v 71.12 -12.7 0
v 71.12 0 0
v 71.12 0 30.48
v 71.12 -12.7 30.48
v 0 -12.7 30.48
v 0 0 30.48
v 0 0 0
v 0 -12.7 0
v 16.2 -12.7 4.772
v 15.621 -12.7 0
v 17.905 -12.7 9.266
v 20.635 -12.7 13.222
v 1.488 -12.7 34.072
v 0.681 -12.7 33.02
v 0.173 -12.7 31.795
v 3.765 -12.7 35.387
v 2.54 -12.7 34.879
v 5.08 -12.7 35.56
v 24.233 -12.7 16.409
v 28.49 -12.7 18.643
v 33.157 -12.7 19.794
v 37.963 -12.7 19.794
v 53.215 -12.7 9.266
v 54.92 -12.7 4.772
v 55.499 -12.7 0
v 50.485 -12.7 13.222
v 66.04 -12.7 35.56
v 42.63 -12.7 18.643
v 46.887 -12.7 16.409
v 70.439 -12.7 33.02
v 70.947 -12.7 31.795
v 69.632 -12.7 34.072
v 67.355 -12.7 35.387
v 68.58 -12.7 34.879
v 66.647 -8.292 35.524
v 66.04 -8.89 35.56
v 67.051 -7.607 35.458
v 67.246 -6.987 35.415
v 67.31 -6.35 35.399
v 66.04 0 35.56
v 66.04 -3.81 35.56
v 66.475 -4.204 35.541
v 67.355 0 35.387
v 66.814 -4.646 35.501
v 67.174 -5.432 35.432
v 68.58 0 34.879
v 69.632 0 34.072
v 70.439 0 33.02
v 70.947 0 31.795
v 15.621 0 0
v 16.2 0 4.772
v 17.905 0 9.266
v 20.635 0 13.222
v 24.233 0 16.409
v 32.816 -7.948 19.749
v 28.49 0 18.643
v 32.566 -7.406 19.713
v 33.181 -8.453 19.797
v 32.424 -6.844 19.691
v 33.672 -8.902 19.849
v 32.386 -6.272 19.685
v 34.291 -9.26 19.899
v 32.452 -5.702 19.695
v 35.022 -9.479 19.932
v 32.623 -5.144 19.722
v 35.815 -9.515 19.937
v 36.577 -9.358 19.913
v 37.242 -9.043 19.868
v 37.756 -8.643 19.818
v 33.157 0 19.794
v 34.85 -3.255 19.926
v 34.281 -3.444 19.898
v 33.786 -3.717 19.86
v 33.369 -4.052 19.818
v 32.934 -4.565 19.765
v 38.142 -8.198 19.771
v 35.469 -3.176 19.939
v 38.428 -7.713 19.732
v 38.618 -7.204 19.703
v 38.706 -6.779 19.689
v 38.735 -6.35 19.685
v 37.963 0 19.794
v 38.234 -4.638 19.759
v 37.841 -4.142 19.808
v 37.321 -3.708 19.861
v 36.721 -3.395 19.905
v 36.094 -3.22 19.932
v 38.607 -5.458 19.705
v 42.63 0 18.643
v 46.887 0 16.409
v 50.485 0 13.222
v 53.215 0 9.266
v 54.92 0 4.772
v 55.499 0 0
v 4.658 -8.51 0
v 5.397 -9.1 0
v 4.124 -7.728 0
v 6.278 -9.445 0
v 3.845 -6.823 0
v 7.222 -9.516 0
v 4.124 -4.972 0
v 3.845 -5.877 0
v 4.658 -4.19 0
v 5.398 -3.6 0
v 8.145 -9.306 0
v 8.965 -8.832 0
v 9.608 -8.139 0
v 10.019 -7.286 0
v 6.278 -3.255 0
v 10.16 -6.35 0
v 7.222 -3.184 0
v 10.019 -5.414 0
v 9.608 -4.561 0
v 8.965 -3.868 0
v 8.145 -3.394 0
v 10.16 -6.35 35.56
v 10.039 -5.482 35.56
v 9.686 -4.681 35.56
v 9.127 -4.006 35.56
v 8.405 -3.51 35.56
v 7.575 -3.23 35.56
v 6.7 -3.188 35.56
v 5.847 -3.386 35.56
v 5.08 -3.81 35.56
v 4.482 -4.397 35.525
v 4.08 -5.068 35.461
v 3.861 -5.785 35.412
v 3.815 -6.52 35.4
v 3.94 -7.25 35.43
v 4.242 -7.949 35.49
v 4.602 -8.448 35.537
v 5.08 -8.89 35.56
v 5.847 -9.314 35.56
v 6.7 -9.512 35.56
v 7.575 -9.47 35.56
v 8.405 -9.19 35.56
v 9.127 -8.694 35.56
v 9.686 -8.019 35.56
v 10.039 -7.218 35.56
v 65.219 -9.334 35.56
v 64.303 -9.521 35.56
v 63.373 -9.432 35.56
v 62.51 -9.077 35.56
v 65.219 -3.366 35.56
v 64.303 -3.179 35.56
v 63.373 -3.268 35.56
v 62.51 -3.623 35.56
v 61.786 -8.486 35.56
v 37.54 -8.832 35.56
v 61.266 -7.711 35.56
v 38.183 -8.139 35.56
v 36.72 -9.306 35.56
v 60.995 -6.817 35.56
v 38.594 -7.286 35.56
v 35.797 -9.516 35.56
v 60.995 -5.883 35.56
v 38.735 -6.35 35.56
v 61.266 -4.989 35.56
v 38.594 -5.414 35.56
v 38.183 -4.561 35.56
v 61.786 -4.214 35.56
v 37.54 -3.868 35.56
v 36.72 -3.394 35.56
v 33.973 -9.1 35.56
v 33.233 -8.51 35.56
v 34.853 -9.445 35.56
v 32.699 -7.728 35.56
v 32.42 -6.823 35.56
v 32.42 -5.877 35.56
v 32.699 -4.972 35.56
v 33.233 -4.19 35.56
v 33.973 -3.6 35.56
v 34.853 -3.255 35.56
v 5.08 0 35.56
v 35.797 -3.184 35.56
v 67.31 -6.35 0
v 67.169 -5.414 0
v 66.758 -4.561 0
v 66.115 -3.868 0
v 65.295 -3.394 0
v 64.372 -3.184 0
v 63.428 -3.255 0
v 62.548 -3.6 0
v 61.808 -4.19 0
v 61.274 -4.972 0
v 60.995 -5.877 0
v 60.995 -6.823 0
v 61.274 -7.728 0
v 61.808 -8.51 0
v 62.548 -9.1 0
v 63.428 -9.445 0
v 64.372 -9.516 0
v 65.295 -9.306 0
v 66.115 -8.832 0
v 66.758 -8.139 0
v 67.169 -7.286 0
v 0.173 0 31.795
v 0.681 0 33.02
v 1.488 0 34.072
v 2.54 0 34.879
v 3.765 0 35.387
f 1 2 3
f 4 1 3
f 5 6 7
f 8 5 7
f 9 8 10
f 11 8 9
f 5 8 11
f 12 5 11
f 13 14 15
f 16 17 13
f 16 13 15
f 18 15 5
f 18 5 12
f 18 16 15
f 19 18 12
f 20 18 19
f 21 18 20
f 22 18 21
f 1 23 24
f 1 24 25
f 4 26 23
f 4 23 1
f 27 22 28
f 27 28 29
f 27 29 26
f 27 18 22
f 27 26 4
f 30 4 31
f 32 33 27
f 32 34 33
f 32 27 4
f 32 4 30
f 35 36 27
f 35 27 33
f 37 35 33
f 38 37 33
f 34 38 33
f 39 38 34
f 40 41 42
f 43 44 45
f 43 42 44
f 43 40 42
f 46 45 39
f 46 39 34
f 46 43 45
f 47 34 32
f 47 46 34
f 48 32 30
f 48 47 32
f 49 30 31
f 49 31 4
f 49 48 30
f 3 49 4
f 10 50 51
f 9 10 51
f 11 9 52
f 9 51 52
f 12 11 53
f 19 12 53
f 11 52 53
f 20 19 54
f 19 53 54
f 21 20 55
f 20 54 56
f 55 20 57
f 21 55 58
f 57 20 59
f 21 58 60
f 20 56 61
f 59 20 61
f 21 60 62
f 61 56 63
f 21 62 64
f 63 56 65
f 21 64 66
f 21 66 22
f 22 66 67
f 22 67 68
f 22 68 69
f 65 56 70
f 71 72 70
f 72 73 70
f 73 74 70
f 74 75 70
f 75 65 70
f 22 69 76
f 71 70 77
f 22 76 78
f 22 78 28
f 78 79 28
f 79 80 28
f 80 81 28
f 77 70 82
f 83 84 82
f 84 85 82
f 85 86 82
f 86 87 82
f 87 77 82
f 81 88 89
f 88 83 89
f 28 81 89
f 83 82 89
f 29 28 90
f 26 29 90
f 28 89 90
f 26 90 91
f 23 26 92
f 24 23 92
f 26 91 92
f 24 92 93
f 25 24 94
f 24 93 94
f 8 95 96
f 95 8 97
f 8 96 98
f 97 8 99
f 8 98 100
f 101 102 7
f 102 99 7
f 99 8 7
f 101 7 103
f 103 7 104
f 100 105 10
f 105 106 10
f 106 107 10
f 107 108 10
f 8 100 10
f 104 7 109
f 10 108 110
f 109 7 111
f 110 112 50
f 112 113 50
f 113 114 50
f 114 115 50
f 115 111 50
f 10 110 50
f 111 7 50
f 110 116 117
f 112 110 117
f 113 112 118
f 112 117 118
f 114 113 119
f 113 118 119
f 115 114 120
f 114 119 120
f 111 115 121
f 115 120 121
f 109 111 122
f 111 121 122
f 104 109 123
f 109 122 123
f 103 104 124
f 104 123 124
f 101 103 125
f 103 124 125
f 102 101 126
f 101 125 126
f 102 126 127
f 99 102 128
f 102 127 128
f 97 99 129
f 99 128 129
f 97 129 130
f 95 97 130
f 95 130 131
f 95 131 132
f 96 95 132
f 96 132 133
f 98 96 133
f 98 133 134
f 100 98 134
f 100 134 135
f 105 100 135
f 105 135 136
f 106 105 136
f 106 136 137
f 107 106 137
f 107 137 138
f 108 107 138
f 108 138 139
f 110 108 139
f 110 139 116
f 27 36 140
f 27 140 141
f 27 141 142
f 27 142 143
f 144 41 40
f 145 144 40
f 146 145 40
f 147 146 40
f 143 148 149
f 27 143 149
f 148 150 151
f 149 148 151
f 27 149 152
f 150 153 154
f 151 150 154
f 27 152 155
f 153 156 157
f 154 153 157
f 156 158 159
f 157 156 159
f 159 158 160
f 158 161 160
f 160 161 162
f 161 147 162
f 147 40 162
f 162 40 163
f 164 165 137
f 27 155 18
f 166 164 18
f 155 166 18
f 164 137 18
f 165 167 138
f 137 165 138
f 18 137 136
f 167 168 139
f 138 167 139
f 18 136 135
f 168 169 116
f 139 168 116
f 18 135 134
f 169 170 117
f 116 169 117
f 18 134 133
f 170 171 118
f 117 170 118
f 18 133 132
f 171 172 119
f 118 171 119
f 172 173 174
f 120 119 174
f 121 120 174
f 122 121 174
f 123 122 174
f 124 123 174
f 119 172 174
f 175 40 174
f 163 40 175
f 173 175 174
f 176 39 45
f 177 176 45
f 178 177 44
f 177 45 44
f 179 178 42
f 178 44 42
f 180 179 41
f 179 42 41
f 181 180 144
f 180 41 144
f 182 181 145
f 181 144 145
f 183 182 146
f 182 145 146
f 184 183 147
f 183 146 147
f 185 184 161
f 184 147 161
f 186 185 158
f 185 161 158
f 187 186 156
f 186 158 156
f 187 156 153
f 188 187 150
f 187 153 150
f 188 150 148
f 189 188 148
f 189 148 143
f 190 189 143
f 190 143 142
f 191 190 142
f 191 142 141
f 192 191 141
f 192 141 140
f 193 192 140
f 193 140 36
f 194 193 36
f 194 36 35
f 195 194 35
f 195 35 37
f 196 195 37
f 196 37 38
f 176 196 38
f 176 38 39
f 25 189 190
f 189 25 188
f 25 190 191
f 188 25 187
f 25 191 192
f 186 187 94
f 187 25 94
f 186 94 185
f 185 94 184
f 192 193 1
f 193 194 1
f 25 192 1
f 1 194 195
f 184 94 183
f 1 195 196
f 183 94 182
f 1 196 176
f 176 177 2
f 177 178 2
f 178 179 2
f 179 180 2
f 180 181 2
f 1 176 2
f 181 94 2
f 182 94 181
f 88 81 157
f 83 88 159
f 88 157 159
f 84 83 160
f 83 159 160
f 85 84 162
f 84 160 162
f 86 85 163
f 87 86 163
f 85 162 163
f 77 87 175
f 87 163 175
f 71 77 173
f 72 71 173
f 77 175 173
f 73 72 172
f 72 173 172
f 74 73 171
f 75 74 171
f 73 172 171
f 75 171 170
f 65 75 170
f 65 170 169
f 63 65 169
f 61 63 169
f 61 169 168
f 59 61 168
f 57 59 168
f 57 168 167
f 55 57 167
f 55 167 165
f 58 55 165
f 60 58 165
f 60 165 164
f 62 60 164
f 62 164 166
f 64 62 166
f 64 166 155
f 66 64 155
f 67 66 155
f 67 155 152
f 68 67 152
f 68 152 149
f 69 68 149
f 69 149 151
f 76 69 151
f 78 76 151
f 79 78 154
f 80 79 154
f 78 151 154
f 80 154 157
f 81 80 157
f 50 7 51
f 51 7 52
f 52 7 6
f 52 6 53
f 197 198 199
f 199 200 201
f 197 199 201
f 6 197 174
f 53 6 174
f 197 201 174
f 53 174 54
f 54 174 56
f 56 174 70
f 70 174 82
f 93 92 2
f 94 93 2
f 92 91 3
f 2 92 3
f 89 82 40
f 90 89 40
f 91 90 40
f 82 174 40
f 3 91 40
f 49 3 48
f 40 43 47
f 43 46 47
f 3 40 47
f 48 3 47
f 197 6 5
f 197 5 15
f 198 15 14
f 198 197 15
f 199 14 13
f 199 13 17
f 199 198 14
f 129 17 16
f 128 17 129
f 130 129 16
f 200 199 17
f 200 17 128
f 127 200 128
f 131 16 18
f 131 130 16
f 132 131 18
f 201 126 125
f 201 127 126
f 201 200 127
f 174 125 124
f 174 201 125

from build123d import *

# Parameters (mm, degrees)
F1_DEPTH    = 12.7
F2_R        = 3.175
F3_DEPTH    = 35.561
F4_R        = 3.175
F5_DEPTH    = 15.8764097817
F6_T1_DEPTH = 38.1


# Not quite as in the source:
# - a fillet or chamfer that OpenCascade refuses, or shapes differently, is made with other operations: its cross-section is extruded or revolved along the edge and cut away or added


with BuildPart() as f1:
    # F0 (on Front) → F1 (new body)
    with BuildSketch(Plane.XZ):
        with BuildLine():
            Line((0, 35.56), (0, 0))
            Line((0, 0), (15.621, 0))
            ThreePointArc((15.621, 0), (35.56, 19.939), (55.499, 0))
            Line((55.499, 0), (71.12, 0))
            Line((71.12, 0), (71.12, 35.56))
            Line((71.12, 35.56), (0, 35.56))
        make_face()
    extrude(amount=F1_DEPTH)

    # F2 (on face) → F3 (cut, through all)
    with BuildSketch(Plane.XY.offset(35.56)):
        with Locations((6.985, -6.35)):
            Circle(F2_R)
        with Locations((64.135, -6.35)):
            Circle(F2_R)
    extrude(amount=-F3_DEPTH, mode=Mode.SUBTRACT)

    # F4 (on face) → F5 (cut, through all)
    with BuildSketch(Plane.XY.offset(35.56)):
        with Locations((35.56, -6.35)):
            Circle(F4_R)
    extrude(amount=-F5_DEPTH, mode=Mode.SUBTRACT)

    # F6: fillet of radius 5.08 on 2 edges, made by hand

    # F6_s2 → F6_t1 (cut)
    with BuildSketch(Plane.XZ.offset(-12.7)):
        with BuildLine():
            ThreePointArc((0, 30.48), (1.4878975516, 34.0721024484), (5.08, 35.56))
            Line((5.08, 35.56), (0, 35.56))
            Line((0, 35.56), (0, 30.48))
        make_face()
        with BuildLine():
            ThreePointArc((66.04, 35.56), (69.6321024484, 34.0721024484), (71.12, 30.48))
            Line((71.12, 30.48), (71.12, 35.56))
            Line((71.12, 35.56), (66.04, 35.56))
        make_face()
    extrude(amount=F6_T1_DEPTH, mode=Mode.SUBTRACT)


solid = f1.part
